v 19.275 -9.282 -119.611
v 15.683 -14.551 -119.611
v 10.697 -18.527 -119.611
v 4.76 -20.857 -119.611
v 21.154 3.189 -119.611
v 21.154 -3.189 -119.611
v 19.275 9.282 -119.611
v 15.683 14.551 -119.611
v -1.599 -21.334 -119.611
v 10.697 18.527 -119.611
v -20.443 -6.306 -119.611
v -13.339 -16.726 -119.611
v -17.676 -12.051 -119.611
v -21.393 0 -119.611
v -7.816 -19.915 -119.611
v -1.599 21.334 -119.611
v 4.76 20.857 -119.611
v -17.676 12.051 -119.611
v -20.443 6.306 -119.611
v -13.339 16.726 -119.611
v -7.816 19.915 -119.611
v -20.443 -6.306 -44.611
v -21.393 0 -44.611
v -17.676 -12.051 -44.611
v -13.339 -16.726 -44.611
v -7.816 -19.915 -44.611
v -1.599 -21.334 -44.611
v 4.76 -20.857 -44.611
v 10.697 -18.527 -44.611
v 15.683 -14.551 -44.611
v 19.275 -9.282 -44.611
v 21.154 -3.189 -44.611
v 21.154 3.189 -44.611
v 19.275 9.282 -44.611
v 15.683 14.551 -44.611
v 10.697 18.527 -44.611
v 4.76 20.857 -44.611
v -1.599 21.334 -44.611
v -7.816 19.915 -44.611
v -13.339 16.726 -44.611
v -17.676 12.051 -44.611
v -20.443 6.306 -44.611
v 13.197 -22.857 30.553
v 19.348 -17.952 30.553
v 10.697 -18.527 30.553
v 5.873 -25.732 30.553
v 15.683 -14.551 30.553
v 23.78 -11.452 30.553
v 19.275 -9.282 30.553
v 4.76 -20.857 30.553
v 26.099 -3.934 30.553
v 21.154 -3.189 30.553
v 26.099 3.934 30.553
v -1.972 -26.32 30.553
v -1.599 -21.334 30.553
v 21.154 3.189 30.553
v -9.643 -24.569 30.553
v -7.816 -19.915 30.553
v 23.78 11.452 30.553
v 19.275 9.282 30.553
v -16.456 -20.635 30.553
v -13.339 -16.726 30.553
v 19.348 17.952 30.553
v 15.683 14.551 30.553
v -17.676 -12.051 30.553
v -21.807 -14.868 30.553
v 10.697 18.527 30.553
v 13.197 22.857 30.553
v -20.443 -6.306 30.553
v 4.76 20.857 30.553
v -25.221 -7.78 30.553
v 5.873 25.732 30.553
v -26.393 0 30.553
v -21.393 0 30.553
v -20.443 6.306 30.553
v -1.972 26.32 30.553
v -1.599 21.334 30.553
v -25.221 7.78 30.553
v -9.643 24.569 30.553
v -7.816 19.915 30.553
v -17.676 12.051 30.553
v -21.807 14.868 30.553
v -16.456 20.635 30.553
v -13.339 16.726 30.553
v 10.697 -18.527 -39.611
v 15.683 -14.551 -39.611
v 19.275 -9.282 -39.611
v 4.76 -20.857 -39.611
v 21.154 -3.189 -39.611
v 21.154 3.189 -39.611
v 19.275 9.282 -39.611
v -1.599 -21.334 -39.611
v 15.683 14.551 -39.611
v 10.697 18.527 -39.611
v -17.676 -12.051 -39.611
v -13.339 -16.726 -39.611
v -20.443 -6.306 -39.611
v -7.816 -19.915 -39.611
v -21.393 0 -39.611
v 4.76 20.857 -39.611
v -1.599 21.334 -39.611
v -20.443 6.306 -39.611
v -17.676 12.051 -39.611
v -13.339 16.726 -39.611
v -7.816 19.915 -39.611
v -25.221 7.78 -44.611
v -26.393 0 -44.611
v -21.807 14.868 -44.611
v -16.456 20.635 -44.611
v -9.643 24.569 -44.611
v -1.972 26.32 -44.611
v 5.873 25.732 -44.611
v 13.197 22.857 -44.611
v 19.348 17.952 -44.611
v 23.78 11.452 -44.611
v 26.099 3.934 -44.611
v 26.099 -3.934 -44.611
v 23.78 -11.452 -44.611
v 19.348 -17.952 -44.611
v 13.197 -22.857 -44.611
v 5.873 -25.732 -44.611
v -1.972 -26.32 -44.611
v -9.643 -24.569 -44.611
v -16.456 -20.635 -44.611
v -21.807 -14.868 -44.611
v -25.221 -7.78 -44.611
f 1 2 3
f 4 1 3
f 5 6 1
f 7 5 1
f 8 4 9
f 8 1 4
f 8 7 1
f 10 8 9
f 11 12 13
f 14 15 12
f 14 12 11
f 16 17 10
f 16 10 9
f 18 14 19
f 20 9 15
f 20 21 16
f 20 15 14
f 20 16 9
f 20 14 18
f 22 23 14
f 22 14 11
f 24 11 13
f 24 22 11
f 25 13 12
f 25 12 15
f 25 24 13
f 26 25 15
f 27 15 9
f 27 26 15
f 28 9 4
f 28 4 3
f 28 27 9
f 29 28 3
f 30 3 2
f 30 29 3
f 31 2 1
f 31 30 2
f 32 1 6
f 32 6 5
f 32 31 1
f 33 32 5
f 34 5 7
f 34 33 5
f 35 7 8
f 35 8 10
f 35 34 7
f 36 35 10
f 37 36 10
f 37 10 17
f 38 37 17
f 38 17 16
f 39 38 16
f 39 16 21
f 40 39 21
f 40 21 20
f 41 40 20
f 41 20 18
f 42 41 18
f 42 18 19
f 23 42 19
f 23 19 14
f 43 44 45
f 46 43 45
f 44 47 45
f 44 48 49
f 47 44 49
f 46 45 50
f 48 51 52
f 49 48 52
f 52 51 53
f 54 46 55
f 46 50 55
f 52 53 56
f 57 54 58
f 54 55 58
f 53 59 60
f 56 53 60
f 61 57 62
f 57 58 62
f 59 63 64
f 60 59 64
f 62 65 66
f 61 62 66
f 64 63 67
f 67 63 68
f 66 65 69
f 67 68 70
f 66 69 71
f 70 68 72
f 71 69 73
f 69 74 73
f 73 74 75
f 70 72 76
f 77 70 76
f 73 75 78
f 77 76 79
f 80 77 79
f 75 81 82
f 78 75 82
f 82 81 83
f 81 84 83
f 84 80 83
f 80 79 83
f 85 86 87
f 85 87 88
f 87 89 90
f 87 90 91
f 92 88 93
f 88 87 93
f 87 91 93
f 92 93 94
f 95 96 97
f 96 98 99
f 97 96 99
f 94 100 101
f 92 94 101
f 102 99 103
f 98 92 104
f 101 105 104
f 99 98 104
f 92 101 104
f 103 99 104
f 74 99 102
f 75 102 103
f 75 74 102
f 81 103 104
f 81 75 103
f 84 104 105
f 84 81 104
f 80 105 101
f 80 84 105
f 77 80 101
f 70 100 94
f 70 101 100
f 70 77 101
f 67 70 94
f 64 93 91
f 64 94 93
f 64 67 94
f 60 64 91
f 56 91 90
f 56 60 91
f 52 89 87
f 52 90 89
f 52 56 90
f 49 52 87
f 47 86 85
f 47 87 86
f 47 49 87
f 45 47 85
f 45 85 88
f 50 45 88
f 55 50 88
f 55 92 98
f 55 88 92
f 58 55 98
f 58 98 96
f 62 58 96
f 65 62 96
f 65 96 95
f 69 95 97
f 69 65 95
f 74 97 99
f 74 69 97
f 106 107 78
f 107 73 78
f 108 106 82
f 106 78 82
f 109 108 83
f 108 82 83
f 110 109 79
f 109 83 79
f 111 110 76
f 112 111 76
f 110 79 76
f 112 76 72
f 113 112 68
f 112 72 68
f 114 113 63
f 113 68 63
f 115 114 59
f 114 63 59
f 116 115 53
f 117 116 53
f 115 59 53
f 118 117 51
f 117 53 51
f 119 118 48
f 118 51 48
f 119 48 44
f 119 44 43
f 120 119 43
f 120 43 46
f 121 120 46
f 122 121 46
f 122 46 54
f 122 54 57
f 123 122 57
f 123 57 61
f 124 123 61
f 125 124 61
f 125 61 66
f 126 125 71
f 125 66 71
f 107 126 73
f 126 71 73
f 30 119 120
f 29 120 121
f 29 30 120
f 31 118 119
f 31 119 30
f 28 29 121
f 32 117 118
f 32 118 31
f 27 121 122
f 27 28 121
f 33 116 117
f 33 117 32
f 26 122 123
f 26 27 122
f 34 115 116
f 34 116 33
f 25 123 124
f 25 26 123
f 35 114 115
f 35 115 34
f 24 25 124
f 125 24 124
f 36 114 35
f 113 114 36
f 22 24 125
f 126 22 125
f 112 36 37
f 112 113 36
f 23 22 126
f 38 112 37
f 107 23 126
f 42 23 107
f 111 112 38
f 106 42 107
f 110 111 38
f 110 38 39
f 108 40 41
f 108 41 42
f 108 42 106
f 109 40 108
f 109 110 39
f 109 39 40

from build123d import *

# Parameters (mm, degrees)
F0_W     = 26.393443346
F0_H     = 75.1639362425
F2_T     = -5
F3_DEPTH = 80


with BuildPart() as f1:
    # F0 (on Front) → F1 (revolve)
    with BuildSketch(Plane.XZ):
        with Locations((-13.196721673, -7.0286886767)):
            Rectangle(F0_W, F0_H)
    revolve(axis=Axis((0, 0, -7.0286886767), (0, 0, -1)))

    # F2
    f2_openings = [f1.faces().sort_by_distance(p)[0] for p in [
        (0, 0, 30.553279),
    ]]
    offset(amount=F2_T, openings=f2_openings)

    # F3 (add): a face of the model
    f3_faces = [f1.faces().sort_by_distance(p)[0] for p in [
        (0, 0, -39.6106567979),
    ]]
    extrude(f3_faces, amount=-F3_DEPTH)


solid = f1.part
